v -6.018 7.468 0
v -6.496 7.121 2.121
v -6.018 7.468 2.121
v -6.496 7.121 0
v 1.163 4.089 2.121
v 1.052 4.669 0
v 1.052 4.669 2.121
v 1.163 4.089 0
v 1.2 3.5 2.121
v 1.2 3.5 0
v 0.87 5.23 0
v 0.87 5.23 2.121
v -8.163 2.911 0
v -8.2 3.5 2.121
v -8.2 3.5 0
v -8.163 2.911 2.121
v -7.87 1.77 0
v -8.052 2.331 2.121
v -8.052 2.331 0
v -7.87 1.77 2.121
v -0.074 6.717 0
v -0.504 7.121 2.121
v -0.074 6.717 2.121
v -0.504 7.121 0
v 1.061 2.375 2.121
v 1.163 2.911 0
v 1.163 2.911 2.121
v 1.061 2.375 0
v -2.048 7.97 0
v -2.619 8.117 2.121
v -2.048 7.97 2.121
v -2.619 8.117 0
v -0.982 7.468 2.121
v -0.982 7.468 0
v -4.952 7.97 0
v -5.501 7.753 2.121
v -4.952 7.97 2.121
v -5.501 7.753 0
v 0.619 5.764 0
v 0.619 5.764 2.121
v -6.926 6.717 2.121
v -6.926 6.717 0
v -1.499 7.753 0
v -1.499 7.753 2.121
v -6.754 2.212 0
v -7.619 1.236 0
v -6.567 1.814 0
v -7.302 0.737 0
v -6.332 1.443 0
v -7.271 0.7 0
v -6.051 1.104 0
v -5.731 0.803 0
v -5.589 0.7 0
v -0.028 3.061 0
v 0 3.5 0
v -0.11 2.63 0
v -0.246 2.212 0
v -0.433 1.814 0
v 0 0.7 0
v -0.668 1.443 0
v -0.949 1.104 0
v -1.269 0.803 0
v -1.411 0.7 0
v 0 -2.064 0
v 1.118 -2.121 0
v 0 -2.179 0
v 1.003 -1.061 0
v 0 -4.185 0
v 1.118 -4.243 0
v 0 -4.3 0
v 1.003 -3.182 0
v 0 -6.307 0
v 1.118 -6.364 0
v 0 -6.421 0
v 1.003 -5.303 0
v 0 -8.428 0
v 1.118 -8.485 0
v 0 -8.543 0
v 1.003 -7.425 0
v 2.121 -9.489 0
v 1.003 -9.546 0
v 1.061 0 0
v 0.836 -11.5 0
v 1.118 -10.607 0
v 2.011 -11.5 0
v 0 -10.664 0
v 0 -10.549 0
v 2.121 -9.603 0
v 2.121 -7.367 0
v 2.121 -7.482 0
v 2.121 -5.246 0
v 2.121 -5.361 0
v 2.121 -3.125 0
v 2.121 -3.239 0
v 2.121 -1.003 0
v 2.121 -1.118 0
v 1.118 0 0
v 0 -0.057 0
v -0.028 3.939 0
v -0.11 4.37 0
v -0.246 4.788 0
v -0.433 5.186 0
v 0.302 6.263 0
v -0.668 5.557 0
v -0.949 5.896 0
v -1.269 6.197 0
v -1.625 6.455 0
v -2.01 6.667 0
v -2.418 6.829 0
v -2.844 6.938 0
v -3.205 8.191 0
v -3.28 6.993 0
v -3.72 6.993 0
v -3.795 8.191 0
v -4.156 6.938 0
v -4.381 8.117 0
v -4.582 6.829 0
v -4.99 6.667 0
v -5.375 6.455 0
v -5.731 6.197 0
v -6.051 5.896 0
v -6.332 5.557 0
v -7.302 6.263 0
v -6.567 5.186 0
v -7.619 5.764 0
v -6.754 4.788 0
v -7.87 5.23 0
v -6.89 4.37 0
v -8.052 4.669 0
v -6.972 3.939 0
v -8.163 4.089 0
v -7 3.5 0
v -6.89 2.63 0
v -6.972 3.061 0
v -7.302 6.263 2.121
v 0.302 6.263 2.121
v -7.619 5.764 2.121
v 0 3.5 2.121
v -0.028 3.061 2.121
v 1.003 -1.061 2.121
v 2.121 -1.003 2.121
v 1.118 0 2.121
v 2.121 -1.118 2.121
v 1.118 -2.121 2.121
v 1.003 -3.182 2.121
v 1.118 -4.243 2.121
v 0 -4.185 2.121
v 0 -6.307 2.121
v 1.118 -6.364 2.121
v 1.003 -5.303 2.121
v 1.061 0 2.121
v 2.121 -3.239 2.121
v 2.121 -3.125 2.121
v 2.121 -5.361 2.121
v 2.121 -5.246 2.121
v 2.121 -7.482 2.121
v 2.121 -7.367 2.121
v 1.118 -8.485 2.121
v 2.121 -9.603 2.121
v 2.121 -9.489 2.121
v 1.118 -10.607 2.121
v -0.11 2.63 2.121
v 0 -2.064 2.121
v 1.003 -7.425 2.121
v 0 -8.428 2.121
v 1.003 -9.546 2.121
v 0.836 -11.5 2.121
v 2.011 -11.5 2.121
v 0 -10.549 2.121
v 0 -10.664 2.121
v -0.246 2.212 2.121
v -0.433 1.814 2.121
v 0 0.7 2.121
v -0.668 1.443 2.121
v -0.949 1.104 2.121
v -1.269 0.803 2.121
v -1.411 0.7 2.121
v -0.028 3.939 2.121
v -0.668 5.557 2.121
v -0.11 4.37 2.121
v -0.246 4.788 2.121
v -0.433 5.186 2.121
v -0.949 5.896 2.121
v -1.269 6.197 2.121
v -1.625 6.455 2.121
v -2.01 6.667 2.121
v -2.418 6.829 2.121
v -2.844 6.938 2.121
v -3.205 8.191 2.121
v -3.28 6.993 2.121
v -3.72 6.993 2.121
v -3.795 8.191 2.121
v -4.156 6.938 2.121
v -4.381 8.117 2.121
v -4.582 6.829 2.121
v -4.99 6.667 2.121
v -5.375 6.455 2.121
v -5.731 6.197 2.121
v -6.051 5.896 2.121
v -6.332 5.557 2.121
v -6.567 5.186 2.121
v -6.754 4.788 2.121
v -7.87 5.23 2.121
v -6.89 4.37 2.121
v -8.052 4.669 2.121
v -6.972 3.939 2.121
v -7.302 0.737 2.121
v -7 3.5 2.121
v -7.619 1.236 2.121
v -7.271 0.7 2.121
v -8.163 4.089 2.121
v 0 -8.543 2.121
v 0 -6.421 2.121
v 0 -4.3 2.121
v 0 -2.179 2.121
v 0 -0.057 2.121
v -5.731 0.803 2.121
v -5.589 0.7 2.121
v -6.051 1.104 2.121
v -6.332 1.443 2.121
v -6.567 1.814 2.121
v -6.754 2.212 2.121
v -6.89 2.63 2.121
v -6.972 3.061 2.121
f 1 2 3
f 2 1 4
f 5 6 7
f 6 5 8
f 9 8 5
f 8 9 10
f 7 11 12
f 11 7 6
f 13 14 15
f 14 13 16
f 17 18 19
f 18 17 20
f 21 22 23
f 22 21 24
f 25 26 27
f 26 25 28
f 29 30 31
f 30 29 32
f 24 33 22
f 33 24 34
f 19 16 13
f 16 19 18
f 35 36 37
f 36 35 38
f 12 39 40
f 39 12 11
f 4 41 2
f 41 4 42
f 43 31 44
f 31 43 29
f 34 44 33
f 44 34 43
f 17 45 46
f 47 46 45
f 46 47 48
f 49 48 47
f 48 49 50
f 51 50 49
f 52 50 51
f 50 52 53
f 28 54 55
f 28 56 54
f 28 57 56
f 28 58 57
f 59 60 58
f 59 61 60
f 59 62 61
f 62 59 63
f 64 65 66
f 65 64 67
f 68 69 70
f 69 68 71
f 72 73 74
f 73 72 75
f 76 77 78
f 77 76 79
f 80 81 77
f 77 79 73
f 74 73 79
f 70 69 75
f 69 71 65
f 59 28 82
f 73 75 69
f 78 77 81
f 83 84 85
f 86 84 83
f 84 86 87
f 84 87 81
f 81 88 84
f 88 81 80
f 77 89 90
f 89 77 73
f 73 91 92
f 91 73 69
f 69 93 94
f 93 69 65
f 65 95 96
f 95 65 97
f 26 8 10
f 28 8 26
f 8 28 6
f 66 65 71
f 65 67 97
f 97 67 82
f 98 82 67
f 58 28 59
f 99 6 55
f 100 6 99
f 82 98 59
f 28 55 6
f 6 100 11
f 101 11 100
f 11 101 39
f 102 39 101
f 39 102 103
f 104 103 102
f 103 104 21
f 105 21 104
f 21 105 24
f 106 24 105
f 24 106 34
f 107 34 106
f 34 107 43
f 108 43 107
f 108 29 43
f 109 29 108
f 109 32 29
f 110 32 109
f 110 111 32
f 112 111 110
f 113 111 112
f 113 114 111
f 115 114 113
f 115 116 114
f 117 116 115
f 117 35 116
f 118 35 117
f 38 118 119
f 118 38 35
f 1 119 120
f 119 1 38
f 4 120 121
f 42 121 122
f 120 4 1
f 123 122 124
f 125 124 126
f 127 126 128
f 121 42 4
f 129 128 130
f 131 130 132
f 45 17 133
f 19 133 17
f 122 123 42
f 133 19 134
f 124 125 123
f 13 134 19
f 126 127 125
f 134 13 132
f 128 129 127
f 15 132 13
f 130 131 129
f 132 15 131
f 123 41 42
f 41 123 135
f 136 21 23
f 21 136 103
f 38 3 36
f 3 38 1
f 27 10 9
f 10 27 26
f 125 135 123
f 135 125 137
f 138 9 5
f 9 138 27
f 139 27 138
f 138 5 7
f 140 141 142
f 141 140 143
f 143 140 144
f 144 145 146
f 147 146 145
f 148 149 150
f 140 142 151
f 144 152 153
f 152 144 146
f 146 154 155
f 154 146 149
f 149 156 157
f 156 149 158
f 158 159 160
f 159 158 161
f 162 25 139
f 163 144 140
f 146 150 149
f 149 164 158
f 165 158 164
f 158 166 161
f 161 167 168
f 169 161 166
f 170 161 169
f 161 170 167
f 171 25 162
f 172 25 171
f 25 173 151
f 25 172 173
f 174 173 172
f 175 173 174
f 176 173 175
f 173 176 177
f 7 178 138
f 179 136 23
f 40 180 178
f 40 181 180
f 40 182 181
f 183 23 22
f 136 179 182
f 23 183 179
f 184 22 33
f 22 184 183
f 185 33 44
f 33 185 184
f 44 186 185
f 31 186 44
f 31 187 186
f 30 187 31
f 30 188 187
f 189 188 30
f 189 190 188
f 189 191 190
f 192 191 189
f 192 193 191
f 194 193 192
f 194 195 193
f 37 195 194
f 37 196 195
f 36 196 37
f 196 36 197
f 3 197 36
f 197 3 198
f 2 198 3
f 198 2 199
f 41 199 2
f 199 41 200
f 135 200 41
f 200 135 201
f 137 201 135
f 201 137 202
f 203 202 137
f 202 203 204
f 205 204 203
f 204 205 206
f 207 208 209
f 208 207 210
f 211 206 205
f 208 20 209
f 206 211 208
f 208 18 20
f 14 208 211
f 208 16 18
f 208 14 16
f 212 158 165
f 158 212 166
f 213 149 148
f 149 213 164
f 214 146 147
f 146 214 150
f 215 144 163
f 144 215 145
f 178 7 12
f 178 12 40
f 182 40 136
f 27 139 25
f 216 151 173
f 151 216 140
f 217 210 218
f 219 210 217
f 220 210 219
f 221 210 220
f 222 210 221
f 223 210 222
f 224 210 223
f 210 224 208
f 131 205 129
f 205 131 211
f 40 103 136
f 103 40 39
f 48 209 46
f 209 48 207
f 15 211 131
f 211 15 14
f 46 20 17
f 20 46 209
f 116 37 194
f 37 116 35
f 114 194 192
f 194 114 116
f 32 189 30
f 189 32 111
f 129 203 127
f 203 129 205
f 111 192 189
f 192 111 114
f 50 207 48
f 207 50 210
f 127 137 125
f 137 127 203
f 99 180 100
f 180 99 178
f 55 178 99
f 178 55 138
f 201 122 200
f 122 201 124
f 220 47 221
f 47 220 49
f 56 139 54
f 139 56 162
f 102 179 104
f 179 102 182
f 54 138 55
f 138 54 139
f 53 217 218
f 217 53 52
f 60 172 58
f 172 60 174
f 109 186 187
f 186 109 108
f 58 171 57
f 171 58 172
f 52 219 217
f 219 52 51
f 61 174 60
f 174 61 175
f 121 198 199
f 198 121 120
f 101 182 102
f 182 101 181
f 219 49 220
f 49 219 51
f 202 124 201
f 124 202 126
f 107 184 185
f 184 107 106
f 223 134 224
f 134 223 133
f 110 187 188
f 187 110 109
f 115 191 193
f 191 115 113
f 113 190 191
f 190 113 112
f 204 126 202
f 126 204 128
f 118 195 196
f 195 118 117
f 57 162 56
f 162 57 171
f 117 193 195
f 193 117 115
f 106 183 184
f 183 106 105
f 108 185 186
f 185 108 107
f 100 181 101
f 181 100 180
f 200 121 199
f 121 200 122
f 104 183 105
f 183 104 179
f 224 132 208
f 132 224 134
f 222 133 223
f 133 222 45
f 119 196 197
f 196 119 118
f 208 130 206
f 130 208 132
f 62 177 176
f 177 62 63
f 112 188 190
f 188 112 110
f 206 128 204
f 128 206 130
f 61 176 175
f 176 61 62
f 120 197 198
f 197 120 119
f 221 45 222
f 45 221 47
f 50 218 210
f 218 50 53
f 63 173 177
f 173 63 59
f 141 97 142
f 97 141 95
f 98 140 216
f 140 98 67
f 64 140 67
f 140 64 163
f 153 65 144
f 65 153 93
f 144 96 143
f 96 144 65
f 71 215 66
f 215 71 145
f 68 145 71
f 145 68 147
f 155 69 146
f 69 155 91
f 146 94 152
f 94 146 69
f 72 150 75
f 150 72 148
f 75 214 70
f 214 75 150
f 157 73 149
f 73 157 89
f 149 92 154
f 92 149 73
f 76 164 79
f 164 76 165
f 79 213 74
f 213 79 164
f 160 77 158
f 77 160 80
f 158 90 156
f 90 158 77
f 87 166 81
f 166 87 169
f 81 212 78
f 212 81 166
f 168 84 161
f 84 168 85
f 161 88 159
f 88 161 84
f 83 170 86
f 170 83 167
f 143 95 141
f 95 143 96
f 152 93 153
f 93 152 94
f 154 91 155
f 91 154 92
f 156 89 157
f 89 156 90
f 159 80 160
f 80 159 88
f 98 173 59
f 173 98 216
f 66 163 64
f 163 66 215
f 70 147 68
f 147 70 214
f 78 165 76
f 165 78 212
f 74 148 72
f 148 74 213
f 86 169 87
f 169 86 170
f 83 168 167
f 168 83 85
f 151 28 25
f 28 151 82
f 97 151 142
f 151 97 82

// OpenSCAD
$fn = 50*1;

root = 7;
hole = 3;
deep = 15;

thick = sqrt(pow(hole/2,2)+pow(hole/2,2));


difference(){

translate([-root/2,root/2,0]){
    cylinder(r=root/2+1.2,h=thick);
}

translate([-root/2,root/2,-0.01]){
    cylinder(r=root/2,h=thick+02);
}

translate([-25,-50+root/10,-0.01]){
    cube([50,50,thick+0.02]);
}

}

difference(){

    translate([0,-deep+root/2,0]){
        cube([thick,deep,thick]);
    }

    for(i=[0:10]){
        translate([8/1.4 +thick/2,0-i*thick,thick/2]){
            rotate([0,0,45]){
                cube([8,8,thick+0.02],center=true);
            }
        }
        translate([-8/1.4+thick/2,-thick/2-i*thick,thick/2]){
            rotate([0,0,45]){
                cube([8,8,thick+0.02],center=true);
            }
        }
    }
    translate([thick/2,0,-0.01]){
        cube([8,8,thick+0.02]);
    }
}
